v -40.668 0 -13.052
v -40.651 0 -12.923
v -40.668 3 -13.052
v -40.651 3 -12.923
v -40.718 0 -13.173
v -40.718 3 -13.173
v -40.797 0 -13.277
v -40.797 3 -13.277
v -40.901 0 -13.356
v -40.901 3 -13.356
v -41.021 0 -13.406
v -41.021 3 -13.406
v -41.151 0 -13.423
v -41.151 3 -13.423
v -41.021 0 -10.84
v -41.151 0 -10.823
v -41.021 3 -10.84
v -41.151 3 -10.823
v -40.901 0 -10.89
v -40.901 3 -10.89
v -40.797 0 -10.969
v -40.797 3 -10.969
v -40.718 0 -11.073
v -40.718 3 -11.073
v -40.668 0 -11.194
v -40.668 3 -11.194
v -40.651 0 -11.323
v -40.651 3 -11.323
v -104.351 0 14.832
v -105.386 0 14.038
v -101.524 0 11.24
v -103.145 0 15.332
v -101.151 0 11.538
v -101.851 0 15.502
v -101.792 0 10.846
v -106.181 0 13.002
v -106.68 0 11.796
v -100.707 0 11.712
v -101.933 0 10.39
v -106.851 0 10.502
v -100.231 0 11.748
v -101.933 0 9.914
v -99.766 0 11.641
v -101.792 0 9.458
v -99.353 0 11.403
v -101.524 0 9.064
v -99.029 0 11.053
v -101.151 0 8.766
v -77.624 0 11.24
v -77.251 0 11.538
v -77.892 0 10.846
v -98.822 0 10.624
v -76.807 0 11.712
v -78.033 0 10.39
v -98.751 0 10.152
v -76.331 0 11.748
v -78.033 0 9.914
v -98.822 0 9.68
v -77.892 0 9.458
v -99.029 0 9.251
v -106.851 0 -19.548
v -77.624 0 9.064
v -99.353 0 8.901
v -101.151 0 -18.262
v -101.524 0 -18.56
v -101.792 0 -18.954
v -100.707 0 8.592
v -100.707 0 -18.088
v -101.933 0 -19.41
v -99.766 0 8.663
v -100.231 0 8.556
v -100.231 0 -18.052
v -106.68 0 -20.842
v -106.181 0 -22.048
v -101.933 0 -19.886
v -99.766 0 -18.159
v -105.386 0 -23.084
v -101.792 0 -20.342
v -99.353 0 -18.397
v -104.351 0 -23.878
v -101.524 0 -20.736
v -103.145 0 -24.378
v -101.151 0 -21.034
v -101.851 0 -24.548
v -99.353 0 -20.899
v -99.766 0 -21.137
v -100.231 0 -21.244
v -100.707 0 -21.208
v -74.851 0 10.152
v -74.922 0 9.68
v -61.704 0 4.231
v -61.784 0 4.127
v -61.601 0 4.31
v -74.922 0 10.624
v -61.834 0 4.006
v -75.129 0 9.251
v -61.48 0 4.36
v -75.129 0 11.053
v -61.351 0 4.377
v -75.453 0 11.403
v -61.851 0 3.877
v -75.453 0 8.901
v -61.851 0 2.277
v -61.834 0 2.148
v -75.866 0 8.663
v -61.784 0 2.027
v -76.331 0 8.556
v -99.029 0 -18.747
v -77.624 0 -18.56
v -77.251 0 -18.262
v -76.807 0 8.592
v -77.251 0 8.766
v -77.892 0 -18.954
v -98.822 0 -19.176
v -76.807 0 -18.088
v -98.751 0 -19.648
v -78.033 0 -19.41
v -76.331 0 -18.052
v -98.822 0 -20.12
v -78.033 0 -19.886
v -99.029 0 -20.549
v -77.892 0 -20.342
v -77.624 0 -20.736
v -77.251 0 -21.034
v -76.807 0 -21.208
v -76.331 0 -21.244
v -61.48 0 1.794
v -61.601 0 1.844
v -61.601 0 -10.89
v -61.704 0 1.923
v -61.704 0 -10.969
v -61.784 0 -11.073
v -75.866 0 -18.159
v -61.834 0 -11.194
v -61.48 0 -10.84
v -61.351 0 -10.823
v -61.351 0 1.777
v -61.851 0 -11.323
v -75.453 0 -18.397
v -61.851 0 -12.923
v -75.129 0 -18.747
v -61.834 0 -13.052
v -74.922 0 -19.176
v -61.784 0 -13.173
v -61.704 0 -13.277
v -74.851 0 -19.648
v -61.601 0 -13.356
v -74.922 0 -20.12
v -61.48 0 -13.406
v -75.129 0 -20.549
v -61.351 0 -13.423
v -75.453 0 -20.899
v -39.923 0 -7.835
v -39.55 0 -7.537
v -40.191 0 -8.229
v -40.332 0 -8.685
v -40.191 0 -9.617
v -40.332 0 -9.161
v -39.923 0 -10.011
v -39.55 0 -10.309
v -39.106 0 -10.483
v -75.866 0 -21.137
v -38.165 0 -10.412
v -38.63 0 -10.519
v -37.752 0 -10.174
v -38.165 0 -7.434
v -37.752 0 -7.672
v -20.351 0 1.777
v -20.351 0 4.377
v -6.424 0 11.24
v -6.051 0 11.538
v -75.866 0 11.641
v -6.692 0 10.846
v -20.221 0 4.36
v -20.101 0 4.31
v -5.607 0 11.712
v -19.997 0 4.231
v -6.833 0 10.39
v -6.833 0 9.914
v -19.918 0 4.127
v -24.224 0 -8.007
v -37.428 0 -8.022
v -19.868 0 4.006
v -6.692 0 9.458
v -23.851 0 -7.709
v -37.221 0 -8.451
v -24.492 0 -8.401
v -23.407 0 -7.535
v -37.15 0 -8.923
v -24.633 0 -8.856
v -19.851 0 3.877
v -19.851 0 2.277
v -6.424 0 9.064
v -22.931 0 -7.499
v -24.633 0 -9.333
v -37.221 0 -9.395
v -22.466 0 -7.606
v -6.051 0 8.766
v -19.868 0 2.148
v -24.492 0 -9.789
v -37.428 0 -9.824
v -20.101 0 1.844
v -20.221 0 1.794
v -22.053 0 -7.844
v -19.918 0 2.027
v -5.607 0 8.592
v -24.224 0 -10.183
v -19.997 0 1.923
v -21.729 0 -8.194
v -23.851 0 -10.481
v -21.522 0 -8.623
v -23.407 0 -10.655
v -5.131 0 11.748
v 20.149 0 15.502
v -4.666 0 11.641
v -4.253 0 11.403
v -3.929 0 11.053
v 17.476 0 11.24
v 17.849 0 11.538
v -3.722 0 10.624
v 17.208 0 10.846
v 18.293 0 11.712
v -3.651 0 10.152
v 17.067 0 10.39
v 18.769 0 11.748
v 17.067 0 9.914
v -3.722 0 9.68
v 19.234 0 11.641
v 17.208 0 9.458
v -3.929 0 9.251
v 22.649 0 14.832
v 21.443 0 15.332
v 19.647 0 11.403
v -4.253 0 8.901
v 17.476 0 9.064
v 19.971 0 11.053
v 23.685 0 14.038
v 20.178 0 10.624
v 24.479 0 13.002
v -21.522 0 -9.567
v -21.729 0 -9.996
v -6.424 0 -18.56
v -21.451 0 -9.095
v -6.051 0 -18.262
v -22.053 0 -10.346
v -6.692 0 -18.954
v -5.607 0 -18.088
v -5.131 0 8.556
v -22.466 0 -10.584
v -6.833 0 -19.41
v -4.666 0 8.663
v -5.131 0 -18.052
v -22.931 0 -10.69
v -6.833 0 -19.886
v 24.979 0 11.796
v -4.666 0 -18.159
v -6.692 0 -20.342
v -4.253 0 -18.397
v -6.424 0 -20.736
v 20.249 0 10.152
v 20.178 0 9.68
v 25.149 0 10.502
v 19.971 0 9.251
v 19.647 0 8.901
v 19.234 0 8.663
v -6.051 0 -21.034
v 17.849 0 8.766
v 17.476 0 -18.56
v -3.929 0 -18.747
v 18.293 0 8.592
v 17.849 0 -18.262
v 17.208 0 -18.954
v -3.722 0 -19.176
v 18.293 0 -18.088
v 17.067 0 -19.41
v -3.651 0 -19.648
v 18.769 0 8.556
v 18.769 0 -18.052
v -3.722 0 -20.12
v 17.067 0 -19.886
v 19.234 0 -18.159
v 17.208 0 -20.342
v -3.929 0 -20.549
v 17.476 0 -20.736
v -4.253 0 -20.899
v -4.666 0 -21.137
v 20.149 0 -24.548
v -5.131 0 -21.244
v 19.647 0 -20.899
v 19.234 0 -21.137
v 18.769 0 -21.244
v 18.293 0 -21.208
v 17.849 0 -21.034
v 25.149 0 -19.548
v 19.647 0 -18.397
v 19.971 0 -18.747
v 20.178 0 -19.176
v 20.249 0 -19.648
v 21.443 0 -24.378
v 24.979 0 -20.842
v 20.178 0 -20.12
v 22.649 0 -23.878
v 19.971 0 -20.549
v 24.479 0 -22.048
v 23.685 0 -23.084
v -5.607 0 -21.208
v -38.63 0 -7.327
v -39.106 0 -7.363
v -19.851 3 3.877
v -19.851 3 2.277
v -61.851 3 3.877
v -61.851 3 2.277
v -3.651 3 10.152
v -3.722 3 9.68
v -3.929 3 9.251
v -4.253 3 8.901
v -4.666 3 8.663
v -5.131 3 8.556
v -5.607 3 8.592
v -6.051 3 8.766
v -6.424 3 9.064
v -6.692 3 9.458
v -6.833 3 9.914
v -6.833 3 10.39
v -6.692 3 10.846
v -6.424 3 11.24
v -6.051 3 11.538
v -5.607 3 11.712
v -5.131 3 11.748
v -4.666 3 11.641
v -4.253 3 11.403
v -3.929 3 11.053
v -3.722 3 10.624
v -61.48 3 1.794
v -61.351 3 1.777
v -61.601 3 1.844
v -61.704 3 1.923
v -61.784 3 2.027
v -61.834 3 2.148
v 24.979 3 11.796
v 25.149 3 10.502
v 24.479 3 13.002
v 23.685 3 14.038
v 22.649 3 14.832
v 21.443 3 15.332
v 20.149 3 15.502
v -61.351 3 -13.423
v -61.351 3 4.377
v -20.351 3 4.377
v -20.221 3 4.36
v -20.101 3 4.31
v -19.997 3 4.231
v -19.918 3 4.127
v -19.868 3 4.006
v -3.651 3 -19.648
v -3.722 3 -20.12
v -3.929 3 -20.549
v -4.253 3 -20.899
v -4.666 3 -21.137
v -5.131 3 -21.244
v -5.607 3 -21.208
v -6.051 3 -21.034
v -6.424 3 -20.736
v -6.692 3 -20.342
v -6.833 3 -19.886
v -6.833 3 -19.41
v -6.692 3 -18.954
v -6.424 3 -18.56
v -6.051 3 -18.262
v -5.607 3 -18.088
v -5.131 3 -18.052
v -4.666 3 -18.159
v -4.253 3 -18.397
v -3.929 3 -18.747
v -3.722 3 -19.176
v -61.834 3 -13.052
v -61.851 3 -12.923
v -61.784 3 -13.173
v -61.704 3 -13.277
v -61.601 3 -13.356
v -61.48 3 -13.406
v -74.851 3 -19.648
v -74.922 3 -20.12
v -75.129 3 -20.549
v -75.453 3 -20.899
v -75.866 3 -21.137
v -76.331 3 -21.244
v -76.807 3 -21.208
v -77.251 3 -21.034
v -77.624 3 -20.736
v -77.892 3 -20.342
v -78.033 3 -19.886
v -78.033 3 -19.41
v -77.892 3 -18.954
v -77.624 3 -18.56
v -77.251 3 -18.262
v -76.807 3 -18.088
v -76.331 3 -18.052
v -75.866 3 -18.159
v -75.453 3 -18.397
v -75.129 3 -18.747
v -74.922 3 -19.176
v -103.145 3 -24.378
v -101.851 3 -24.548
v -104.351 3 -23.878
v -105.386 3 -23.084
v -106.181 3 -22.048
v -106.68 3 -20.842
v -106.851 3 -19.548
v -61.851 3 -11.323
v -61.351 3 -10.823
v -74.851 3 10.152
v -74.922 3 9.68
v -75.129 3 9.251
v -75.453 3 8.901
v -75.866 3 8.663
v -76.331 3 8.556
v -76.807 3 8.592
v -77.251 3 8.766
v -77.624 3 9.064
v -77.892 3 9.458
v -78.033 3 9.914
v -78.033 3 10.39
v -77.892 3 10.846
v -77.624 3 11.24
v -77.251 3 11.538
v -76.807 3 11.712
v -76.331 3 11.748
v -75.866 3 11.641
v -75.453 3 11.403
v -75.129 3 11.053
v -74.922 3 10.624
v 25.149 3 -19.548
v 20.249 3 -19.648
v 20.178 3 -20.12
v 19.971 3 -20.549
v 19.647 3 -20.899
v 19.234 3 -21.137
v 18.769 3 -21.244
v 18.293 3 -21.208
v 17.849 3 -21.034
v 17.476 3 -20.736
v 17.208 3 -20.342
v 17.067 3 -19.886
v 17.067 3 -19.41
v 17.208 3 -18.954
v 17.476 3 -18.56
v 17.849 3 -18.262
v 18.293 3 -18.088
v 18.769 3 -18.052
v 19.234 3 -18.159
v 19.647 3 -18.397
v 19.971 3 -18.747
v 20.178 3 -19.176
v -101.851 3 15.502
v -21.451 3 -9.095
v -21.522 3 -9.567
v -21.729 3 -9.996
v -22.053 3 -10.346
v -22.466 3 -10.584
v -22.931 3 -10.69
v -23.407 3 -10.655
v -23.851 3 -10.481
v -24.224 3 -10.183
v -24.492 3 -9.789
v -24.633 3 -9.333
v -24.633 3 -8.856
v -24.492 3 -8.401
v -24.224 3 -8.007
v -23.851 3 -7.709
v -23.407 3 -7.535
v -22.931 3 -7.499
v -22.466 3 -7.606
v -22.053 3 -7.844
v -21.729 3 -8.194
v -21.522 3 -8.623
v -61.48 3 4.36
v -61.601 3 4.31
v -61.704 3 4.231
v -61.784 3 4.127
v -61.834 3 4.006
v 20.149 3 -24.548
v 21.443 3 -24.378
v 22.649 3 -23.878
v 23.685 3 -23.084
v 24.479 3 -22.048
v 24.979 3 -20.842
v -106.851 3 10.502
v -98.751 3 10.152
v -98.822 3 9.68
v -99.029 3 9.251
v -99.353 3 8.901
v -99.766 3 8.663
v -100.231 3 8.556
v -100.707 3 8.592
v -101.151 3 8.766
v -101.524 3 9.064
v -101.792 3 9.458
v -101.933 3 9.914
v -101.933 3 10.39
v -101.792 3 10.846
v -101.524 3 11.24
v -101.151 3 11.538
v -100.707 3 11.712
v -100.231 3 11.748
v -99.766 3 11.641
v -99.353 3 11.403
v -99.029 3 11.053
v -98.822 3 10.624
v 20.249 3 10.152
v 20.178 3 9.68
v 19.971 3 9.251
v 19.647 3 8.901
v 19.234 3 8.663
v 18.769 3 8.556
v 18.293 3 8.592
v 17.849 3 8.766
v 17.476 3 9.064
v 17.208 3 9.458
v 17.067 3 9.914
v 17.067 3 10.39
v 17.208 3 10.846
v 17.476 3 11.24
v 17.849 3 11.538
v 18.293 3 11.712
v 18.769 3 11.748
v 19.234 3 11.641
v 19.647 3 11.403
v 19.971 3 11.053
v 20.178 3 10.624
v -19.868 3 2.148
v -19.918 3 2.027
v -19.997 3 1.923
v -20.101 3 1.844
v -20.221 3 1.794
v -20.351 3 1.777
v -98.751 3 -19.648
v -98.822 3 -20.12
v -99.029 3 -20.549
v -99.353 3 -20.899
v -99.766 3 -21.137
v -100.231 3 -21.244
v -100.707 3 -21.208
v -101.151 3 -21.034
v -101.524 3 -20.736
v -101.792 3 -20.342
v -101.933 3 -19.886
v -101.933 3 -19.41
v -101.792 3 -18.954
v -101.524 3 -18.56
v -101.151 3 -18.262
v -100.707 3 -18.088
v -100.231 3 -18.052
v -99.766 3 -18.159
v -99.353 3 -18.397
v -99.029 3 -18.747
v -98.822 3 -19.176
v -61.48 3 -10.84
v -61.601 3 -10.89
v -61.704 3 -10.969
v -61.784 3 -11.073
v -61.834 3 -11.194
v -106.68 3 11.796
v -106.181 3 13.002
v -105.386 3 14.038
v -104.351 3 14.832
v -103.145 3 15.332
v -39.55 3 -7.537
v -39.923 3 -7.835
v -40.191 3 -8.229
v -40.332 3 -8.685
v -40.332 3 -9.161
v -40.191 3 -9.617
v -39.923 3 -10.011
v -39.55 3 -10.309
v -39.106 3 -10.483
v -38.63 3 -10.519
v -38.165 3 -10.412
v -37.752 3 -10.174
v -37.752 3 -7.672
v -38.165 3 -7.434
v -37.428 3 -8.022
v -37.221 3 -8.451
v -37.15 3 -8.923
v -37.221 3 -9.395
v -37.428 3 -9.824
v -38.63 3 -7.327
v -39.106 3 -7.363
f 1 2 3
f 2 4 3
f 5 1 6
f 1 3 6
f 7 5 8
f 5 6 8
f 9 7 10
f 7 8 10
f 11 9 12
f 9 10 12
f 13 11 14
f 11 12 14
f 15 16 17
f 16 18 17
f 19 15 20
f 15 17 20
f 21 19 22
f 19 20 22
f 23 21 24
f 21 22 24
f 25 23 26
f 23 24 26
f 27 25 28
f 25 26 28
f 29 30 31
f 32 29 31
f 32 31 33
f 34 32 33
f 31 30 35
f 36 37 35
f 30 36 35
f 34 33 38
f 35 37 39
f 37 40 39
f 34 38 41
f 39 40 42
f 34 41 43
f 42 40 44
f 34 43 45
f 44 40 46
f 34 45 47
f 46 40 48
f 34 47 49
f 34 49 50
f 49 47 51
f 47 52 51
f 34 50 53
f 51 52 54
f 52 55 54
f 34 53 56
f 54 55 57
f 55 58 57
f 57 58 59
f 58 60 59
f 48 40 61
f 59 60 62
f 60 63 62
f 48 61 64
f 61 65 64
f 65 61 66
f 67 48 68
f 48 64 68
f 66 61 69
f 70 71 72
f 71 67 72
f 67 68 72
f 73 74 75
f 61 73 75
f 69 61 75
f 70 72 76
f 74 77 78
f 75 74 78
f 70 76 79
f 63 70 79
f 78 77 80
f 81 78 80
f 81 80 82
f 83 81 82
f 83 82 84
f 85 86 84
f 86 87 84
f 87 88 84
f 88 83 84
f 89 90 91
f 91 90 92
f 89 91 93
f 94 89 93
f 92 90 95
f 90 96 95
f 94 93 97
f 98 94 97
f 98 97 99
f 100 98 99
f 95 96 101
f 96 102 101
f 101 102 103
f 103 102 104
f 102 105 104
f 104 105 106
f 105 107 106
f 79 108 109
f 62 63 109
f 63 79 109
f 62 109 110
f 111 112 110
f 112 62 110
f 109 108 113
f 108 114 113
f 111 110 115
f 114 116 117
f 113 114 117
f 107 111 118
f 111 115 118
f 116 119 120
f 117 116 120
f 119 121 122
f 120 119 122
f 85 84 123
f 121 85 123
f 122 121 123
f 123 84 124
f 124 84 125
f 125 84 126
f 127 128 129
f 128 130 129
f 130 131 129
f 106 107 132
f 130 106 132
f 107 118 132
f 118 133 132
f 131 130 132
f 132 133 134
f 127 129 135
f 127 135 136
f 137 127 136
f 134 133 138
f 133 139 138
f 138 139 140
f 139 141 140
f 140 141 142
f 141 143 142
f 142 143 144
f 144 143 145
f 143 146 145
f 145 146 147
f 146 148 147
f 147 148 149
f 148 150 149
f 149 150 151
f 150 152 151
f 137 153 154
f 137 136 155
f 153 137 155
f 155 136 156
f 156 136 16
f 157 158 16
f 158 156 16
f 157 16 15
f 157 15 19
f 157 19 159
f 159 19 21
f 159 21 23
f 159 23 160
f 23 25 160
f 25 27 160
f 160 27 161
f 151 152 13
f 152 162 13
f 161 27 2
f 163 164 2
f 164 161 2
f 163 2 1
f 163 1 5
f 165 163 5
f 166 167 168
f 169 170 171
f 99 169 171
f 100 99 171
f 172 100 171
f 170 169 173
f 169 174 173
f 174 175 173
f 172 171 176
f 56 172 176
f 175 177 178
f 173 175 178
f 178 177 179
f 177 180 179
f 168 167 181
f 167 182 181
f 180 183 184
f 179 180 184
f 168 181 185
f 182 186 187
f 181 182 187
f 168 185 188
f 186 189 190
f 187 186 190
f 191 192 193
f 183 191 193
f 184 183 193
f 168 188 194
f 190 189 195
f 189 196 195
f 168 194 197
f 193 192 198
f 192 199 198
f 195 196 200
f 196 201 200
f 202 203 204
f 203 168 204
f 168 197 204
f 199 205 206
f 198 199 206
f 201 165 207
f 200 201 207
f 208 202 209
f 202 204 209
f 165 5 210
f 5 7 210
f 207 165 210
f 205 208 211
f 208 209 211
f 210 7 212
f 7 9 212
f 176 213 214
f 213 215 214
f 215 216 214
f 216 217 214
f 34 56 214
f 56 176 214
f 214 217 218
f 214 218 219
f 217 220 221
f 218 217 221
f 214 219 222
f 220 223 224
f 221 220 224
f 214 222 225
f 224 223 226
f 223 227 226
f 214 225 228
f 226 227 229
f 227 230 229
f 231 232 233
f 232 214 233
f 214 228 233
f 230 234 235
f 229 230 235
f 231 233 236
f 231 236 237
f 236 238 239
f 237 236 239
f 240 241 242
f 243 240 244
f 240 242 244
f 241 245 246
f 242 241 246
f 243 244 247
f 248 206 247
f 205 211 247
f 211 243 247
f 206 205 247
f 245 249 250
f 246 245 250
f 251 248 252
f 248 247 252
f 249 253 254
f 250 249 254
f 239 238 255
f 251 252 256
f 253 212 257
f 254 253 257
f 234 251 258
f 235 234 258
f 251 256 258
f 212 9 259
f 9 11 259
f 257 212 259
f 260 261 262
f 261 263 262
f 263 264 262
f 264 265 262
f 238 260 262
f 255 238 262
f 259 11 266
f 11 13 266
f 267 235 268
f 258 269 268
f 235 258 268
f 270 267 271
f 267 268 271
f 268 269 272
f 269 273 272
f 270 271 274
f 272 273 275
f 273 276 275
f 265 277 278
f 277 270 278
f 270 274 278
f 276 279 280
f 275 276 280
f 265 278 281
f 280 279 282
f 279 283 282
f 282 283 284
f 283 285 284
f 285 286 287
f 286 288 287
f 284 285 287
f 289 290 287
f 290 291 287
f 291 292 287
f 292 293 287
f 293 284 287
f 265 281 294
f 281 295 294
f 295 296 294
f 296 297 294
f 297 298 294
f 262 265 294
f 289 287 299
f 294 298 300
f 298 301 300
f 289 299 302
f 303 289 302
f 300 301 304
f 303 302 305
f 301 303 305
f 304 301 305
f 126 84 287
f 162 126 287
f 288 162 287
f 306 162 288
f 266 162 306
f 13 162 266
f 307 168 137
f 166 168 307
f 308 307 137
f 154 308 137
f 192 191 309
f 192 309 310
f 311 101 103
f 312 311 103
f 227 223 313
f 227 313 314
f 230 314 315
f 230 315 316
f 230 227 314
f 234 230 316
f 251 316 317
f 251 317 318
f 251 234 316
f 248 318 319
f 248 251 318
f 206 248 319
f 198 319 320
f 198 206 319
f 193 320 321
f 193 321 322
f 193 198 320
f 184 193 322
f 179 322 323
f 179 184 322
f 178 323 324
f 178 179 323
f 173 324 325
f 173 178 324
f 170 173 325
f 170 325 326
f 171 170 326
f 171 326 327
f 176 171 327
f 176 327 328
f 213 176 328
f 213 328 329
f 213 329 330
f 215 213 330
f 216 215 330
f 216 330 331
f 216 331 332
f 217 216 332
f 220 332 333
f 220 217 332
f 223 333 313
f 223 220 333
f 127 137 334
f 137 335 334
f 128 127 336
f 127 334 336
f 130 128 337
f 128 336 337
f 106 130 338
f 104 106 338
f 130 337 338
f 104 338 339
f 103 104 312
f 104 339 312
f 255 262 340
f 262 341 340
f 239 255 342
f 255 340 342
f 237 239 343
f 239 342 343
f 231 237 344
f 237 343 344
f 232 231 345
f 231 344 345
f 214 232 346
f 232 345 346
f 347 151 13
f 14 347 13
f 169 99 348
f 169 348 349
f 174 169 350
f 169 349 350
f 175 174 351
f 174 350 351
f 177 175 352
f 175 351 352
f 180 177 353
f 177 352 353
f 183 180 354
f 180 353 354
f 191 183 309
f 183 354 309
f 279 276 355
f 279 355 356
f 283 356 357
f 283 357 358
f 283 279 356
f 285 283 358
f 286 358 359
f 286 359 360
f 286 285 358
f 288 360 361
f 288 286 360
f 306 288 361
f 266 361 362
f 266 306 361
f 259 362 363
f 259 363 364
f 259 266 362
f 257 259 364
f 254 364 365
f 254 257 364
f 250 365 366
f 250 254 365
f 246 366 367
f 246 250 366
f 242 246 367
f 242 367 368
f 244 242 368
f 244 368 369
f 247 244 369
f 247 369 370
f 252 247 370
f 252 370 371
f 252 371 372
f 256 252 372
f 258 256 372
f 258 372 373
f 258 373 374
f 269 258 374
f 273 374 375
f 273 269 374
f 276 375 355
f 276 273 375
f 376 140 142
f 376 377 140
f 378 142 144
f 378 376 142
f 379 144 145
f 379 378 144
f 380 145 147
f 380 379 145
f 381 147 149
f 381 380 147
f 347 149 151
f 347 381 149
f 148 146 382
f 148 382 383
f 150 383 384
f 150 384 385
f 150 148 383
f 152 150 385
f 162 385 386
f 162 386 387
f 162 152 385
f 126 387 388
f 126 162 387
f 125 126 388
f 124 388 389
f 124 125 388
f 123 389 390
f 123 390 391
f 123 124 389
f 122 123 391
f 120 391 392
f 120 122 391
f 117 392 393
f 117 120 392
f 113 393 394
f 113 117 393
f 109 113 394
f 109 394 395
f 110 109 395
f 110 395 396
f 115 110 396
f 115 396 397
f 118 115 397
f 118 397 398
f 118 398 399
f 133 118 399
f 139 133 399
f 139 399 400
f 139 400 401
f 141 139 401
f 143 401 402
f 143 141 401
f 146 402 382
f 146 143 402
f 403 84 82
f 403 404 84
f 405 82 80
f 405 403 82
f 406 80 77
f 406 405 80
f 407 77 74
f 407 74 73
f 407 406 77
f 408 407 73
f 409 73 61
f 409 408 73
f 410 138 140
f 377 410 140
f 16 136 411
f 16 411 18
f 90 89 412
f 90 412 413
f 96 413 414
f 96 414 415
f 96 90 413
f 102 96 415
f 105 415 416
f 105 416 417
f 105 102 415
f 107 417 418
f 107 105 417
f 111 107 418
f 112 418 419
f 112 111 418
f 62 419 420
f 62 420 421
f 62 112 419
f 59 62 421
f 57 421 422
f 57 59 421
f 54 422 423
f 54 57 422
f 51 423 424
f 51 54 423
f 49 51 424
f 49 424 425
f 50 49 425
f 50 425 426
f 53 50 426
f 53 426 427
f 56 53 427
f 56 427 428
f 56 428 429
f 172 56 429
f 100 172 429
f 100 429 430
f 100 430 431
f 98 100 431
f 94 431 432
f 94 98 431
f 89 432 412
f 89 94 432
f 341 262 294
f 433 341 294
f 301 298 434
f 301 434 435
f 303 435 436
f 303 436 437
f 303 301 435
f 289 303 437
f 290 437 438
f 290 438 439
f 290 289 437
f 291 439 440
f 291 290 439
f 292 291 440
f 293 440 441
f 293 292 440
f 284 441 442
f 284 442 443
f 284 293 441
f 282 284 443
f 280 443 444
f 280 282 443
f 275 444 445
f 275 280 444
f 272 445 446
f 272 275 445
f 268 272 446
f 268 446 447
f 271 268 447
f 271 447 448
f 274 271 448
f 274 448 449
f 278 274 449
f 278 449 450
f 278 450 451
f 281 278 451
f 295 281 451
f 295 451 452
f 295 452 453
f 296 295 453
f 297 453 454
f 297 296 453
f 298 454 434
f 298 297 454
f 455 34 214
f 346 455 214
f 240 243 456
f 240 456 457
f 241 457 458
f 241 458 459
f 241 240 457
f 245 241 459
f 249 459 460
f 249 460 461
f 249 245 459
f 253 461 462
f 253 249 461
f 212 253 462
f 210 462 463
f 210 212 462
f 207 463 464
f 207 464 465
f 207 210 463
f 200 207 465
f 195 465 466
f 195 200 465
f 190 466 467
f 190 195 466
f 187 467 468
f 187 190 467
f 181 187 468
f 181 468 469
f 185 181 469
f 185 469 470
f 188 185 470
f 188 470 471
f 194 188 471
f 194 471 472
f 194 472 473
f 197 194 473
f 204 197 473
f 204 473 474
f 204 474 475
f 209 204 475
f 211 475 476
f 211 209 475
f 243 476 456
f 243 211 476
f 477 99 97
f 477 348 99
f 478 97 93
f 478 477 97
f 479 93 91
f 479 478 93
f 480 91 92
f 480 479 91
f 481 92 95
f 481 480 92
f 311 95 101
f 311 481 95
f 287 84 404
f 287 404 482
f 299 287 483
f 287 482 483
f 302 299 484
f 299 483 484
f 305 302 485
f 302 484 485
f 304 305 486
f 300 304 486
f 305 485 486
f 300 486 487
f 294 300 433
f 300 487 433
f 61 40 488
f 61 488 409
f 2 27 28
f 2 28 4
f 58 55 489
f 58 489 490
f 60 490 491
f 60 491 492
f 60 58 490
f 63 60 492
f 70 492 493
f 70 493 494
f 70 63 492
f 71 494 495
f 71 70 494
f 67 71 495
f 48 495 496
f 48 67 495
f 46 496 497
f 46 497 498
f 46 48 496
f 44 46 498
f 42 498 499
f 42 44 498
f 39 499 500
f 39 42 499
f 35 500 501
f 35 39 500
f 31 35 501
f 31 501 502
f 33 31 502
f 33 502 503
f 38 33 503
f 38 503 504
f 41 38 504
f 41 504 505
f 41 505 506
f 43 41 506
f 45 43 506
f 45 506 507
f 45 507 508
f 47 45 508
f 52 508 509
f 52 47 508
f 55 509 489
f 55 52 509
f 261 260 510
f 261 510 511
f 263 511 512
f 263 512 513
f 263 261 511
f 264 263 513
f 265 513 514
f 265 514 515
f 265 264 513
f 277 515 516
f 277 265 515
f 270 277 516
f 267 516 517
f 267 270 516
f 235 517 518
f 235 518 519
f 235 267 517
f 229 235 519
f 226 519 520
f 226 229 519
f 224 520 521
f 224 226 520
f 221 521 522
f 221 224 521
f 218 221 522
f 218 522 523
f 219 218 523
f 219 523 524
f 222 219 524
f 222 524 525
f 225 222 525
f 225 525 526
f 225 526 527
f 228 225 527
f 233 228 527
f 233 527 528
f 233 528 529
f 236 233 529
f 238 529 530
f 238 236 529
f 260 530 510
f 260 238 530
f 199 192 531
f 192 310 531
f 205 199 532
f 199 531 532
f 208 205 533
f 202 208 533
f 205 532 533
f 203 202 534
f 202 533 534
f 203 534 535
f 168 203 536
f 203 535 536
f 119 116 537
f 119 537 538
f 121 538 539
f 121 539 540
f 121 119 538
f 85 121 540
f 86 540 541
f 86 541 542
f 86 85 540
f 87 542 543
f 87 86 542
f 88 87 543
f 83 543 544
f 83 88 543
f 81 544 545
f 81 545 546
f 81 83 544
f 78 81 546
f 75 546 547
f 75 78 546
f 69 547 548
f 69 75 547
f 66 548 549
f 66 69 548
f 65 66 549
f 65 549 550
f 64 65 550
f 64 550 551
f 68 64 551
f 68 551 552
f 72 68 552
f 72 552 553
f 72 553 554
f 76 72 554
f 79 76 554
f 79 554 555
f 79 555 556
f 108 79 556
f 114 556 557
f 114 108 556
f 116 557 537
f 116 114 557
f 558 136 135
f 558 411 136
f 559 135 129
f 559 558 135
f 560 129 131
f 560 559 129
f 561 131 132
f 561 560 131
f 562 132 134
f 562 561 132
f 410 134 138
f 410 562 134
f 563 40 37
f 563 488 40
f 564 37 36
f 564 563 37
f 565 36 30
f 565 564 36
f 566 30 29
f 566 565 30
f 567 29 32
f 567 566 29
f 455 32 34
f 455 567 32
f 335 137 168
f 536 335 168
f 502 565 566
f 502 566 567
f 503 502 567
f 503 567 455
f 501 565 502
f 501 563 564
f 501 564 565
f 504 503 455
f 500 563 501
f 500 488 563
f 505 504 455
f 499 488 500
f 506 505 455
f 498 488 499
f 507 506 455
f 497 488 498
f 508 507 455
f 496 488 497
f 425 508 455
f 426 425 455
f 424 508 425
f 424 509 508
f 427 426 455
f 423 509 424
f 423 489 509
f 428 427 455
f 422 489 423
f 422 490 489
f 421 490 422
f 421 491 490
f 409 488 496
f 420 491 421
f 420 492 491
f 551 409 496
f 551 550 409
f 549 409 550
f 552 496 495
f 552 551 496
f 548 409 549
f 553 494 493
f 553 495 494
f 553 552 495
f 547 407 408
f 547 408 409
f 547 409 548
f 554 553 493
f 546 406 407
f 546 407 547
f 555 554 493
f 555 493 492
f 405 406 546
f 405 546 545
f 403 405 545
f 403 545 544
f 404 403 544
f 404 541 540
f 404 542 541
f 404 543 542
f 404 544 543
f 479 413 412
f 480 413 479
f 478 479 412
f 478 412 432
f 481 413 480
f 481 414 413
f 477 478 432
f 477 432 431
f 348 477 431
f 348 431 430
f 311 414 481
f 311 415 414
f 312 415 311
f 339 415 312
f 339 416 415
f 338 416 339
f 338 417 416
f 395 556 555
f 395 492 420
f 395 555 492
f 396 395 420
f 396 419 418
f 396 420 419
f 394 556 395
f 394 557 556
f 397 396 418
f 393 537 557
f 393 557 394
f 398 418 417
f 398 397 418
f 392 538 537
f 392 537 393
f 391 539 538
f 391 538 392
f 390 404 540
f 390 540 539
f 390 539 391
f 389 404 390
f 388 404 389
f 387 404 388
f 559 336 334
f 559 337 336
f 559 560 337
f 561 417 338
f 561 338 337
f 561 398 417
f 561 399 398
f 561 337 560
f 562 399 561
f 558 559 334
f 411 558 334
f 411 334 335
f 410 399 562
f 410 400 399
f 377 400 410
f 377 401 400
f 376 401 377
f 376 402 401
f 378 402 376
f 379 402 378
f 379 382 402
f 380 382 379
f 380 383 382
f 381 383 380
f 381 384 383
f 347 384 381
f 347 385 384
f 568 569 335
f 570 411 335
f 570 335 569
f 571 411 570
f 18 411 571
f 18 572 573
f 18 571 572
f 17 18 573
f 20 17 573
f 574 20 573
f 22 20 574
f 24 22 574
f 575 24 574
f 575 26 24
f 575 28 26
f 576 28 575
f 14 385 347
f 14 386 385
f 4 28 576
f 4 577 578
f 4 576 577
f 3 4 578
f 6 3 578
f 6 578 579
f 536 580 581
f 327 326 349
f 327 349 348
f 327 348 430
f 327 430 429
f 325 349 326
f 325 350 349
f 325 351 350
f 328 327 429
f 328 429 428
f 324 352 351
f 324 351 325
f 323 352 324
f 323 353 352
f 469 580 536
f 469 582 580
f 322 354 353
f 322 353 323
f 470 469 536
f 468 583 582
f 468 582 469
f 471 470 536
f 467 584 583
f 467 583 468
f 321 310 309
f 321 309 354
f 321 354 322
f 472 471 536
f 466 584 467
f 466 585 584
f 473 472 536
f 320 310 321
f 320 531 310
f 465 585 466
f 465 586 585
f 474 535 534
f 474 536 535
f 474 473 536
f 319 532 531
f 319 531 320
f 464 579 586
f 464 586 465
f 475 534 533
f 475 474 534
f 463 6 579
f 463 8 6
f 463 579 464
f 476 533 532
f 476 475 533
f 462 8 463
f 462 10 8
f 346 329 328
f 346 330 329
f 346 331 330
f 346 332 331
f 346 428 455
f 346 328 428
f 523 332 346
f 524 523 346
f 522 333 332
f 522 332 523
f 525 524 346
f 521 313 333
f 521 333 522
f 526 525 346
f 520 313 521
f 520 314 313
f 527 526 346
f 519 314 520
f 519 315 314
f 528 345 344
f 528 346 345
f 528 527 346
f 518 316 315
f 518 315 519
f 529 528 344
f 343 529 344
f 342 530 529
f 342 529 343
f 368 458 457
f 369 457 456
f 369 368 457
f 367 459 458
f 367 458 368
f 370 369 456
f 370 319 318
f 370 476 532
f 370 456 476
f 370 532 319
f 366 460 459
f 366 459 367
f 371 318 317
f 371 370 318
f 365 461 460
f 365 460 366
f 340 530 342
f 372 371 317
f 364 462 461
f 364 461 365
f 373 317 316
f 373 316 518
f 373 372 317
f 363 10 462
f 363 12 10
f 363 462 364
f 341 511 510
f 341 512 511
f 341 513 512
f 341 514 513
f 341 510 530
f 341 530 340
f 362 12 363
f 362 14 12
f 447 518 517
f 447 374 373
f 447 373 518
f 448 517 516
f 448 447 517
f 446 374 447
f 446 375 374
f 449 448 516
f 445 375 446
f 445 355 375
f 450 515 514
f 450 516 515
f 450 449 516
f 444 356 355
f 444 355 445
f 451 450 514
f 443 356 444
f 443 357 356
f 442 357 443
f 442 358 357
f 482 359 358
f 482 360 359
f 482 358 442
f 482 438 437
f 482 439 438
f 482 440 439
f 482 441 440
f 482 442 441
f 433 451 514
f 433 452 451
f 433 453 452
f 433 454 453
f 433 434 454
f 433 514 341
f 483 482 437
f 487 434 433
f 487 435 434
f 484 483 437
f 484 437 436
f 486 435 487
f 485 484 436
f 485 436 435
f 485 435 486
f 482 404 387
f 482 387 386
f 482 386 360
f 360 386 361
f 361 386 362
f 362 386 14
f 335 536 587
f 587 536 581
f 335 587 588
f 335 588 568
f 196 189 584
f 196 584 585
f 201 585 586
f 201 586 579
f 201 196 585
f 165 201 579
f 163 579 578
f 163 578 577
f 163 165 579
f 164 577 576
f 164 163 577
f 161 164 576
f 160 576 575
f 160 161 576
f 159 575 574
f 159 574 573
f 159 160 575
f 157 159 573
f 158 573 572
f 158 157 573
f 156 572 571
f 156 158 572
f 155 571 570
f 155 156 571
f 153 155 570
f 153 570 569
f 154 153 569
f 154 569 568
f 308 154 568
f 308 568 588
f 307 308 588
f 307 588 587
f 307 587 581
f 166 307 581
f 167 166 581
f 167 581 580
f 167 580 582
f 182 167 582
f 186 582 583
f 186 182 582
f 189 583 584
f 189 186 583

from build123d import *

# Parameters (mm, degrees)
SKETCH_1_W      = 132
SKETCH_1_H      = 40.05
SKETCH_1_R      = 1.6
SKETCH_1_W_2    = 21.2
SKETCH_1_H_2    = 2.6
SKETCH_1_W_3    = 42
EXTRUDE_1_DEPTH = 3
FILLET_1_R      = 5
FILLET_2_R      = 5
FILLET_3_R      = 0.5


with BuildPart() as part:
    # 草图1 → 凸台-拉伸1 (new body)
    with BuildSketch(Plane(origin=(0, 0, 0), x_dir=(1, 0, 0), z_dir=(0, 1, 0))):
        with Locations((-40.850806452, 4.522983871)):
            Rectangle(SKETCH_1_W, SKETCH_1_H)
        with Locations((18.649193548, 19.647983871)):
            Circle(SKETCH_1_R, mode=Mode.SUBTRACT)
        with Locations((18.649193548, -10.152016129)):
            Circle(SKETCH_1_R, mode=Mode.SUBTRACT)
        with Locations((-5.250806452, 19.647983871)):
            Circle(SKETCH_1_R, mode=Mode.SUBTRACT)
        with Locations((-5.250806452, -10.152016129)):
            Circle(SKETCH_1_R, mode=Mode.SUBTRACT)
        with Locations((-100.350806452, -10.152016129)):
            Circle(SKETCH_1_R, mode=Mode.SUBTRACT)
        with Locations((-76.450806452, -10.152016129)):
            Circle(SKETCH_1_R, mode=Mode.SUBTRACT)
        with Locations((-100.350806452, 19.647983871)):
            Circle(SKETCH_1_R, mode=Mode.SUBTRACT)
        with Locations((-76.450806452, 19.647983871)):
            Circle(SKETCH_1_R, mode=Mode.SUBTRACT)
        with Locations((-38.749865004, 8.922983871)):
            Circle(SKETCH_1_R, mode=Mode.SUBTRACT)
        with Locations((-23.050806452, 9.094915776)):
            Circle(SKETCH_1_R, mode=Mode.SUBTRACT)
        with Locations((-51.250806452, 12.122983871)):
            Rectangle(SKETCH_1_W_2, SKETCH_1_H_2, mode=Mode.SUBTRACT)
        with Locations((-40.850806452, -3.077016129)):
            Rectangle(SKETCH_1_W_3, SKETCH_1_H_2, mode=Mode.SUBTRACT)
    extrude(amount=EXTRUDE_1_DEPTH)

    # 圆角1
    fillet_1_edges = [part.edges().sort_by_distance(p)[0] for p in [
        (25.149193548, 1.5, -24.547983871),
    ]]
    fillet(fillet_1_edges, radius=FILLET_1_R)

    # 圆角2
    fillet_2_edges = [part.edges().sort_by_distance(p)[0] for p in [
        (25.149193548, 1.5, 15.502016129),
        (-106.850806452, 1.5, 15.502016129),
        (-106.850806452, 1.5, -24.547983871),
    ]]
    fillet(fillet_2_edges, radius=FILLET_2_R)

    # 圆角3
    fillet_3_edges = [part.edges().sort_by_distance(p)[0] for p in [
        (-40.650806452, 1.5, -10.822983871),
        (-40.650806452, 1.5, -13.422983871),
        (-61.850806452, 1.5, -13.422983871),
        (-61.850806452, 1.5, -10.822983871),
        (-19.850806452, 1.5, 4.377016129),
        (-19.850806452, 1.5, 1.777016129),
        (-61.850806452, 1.5, 1.777016129),
        (-61.850806452, 1.5, 4.377016129),
    ]]
    fillet(fillet_3_edges, radius=FILLET_3_R)


solid = part.part
